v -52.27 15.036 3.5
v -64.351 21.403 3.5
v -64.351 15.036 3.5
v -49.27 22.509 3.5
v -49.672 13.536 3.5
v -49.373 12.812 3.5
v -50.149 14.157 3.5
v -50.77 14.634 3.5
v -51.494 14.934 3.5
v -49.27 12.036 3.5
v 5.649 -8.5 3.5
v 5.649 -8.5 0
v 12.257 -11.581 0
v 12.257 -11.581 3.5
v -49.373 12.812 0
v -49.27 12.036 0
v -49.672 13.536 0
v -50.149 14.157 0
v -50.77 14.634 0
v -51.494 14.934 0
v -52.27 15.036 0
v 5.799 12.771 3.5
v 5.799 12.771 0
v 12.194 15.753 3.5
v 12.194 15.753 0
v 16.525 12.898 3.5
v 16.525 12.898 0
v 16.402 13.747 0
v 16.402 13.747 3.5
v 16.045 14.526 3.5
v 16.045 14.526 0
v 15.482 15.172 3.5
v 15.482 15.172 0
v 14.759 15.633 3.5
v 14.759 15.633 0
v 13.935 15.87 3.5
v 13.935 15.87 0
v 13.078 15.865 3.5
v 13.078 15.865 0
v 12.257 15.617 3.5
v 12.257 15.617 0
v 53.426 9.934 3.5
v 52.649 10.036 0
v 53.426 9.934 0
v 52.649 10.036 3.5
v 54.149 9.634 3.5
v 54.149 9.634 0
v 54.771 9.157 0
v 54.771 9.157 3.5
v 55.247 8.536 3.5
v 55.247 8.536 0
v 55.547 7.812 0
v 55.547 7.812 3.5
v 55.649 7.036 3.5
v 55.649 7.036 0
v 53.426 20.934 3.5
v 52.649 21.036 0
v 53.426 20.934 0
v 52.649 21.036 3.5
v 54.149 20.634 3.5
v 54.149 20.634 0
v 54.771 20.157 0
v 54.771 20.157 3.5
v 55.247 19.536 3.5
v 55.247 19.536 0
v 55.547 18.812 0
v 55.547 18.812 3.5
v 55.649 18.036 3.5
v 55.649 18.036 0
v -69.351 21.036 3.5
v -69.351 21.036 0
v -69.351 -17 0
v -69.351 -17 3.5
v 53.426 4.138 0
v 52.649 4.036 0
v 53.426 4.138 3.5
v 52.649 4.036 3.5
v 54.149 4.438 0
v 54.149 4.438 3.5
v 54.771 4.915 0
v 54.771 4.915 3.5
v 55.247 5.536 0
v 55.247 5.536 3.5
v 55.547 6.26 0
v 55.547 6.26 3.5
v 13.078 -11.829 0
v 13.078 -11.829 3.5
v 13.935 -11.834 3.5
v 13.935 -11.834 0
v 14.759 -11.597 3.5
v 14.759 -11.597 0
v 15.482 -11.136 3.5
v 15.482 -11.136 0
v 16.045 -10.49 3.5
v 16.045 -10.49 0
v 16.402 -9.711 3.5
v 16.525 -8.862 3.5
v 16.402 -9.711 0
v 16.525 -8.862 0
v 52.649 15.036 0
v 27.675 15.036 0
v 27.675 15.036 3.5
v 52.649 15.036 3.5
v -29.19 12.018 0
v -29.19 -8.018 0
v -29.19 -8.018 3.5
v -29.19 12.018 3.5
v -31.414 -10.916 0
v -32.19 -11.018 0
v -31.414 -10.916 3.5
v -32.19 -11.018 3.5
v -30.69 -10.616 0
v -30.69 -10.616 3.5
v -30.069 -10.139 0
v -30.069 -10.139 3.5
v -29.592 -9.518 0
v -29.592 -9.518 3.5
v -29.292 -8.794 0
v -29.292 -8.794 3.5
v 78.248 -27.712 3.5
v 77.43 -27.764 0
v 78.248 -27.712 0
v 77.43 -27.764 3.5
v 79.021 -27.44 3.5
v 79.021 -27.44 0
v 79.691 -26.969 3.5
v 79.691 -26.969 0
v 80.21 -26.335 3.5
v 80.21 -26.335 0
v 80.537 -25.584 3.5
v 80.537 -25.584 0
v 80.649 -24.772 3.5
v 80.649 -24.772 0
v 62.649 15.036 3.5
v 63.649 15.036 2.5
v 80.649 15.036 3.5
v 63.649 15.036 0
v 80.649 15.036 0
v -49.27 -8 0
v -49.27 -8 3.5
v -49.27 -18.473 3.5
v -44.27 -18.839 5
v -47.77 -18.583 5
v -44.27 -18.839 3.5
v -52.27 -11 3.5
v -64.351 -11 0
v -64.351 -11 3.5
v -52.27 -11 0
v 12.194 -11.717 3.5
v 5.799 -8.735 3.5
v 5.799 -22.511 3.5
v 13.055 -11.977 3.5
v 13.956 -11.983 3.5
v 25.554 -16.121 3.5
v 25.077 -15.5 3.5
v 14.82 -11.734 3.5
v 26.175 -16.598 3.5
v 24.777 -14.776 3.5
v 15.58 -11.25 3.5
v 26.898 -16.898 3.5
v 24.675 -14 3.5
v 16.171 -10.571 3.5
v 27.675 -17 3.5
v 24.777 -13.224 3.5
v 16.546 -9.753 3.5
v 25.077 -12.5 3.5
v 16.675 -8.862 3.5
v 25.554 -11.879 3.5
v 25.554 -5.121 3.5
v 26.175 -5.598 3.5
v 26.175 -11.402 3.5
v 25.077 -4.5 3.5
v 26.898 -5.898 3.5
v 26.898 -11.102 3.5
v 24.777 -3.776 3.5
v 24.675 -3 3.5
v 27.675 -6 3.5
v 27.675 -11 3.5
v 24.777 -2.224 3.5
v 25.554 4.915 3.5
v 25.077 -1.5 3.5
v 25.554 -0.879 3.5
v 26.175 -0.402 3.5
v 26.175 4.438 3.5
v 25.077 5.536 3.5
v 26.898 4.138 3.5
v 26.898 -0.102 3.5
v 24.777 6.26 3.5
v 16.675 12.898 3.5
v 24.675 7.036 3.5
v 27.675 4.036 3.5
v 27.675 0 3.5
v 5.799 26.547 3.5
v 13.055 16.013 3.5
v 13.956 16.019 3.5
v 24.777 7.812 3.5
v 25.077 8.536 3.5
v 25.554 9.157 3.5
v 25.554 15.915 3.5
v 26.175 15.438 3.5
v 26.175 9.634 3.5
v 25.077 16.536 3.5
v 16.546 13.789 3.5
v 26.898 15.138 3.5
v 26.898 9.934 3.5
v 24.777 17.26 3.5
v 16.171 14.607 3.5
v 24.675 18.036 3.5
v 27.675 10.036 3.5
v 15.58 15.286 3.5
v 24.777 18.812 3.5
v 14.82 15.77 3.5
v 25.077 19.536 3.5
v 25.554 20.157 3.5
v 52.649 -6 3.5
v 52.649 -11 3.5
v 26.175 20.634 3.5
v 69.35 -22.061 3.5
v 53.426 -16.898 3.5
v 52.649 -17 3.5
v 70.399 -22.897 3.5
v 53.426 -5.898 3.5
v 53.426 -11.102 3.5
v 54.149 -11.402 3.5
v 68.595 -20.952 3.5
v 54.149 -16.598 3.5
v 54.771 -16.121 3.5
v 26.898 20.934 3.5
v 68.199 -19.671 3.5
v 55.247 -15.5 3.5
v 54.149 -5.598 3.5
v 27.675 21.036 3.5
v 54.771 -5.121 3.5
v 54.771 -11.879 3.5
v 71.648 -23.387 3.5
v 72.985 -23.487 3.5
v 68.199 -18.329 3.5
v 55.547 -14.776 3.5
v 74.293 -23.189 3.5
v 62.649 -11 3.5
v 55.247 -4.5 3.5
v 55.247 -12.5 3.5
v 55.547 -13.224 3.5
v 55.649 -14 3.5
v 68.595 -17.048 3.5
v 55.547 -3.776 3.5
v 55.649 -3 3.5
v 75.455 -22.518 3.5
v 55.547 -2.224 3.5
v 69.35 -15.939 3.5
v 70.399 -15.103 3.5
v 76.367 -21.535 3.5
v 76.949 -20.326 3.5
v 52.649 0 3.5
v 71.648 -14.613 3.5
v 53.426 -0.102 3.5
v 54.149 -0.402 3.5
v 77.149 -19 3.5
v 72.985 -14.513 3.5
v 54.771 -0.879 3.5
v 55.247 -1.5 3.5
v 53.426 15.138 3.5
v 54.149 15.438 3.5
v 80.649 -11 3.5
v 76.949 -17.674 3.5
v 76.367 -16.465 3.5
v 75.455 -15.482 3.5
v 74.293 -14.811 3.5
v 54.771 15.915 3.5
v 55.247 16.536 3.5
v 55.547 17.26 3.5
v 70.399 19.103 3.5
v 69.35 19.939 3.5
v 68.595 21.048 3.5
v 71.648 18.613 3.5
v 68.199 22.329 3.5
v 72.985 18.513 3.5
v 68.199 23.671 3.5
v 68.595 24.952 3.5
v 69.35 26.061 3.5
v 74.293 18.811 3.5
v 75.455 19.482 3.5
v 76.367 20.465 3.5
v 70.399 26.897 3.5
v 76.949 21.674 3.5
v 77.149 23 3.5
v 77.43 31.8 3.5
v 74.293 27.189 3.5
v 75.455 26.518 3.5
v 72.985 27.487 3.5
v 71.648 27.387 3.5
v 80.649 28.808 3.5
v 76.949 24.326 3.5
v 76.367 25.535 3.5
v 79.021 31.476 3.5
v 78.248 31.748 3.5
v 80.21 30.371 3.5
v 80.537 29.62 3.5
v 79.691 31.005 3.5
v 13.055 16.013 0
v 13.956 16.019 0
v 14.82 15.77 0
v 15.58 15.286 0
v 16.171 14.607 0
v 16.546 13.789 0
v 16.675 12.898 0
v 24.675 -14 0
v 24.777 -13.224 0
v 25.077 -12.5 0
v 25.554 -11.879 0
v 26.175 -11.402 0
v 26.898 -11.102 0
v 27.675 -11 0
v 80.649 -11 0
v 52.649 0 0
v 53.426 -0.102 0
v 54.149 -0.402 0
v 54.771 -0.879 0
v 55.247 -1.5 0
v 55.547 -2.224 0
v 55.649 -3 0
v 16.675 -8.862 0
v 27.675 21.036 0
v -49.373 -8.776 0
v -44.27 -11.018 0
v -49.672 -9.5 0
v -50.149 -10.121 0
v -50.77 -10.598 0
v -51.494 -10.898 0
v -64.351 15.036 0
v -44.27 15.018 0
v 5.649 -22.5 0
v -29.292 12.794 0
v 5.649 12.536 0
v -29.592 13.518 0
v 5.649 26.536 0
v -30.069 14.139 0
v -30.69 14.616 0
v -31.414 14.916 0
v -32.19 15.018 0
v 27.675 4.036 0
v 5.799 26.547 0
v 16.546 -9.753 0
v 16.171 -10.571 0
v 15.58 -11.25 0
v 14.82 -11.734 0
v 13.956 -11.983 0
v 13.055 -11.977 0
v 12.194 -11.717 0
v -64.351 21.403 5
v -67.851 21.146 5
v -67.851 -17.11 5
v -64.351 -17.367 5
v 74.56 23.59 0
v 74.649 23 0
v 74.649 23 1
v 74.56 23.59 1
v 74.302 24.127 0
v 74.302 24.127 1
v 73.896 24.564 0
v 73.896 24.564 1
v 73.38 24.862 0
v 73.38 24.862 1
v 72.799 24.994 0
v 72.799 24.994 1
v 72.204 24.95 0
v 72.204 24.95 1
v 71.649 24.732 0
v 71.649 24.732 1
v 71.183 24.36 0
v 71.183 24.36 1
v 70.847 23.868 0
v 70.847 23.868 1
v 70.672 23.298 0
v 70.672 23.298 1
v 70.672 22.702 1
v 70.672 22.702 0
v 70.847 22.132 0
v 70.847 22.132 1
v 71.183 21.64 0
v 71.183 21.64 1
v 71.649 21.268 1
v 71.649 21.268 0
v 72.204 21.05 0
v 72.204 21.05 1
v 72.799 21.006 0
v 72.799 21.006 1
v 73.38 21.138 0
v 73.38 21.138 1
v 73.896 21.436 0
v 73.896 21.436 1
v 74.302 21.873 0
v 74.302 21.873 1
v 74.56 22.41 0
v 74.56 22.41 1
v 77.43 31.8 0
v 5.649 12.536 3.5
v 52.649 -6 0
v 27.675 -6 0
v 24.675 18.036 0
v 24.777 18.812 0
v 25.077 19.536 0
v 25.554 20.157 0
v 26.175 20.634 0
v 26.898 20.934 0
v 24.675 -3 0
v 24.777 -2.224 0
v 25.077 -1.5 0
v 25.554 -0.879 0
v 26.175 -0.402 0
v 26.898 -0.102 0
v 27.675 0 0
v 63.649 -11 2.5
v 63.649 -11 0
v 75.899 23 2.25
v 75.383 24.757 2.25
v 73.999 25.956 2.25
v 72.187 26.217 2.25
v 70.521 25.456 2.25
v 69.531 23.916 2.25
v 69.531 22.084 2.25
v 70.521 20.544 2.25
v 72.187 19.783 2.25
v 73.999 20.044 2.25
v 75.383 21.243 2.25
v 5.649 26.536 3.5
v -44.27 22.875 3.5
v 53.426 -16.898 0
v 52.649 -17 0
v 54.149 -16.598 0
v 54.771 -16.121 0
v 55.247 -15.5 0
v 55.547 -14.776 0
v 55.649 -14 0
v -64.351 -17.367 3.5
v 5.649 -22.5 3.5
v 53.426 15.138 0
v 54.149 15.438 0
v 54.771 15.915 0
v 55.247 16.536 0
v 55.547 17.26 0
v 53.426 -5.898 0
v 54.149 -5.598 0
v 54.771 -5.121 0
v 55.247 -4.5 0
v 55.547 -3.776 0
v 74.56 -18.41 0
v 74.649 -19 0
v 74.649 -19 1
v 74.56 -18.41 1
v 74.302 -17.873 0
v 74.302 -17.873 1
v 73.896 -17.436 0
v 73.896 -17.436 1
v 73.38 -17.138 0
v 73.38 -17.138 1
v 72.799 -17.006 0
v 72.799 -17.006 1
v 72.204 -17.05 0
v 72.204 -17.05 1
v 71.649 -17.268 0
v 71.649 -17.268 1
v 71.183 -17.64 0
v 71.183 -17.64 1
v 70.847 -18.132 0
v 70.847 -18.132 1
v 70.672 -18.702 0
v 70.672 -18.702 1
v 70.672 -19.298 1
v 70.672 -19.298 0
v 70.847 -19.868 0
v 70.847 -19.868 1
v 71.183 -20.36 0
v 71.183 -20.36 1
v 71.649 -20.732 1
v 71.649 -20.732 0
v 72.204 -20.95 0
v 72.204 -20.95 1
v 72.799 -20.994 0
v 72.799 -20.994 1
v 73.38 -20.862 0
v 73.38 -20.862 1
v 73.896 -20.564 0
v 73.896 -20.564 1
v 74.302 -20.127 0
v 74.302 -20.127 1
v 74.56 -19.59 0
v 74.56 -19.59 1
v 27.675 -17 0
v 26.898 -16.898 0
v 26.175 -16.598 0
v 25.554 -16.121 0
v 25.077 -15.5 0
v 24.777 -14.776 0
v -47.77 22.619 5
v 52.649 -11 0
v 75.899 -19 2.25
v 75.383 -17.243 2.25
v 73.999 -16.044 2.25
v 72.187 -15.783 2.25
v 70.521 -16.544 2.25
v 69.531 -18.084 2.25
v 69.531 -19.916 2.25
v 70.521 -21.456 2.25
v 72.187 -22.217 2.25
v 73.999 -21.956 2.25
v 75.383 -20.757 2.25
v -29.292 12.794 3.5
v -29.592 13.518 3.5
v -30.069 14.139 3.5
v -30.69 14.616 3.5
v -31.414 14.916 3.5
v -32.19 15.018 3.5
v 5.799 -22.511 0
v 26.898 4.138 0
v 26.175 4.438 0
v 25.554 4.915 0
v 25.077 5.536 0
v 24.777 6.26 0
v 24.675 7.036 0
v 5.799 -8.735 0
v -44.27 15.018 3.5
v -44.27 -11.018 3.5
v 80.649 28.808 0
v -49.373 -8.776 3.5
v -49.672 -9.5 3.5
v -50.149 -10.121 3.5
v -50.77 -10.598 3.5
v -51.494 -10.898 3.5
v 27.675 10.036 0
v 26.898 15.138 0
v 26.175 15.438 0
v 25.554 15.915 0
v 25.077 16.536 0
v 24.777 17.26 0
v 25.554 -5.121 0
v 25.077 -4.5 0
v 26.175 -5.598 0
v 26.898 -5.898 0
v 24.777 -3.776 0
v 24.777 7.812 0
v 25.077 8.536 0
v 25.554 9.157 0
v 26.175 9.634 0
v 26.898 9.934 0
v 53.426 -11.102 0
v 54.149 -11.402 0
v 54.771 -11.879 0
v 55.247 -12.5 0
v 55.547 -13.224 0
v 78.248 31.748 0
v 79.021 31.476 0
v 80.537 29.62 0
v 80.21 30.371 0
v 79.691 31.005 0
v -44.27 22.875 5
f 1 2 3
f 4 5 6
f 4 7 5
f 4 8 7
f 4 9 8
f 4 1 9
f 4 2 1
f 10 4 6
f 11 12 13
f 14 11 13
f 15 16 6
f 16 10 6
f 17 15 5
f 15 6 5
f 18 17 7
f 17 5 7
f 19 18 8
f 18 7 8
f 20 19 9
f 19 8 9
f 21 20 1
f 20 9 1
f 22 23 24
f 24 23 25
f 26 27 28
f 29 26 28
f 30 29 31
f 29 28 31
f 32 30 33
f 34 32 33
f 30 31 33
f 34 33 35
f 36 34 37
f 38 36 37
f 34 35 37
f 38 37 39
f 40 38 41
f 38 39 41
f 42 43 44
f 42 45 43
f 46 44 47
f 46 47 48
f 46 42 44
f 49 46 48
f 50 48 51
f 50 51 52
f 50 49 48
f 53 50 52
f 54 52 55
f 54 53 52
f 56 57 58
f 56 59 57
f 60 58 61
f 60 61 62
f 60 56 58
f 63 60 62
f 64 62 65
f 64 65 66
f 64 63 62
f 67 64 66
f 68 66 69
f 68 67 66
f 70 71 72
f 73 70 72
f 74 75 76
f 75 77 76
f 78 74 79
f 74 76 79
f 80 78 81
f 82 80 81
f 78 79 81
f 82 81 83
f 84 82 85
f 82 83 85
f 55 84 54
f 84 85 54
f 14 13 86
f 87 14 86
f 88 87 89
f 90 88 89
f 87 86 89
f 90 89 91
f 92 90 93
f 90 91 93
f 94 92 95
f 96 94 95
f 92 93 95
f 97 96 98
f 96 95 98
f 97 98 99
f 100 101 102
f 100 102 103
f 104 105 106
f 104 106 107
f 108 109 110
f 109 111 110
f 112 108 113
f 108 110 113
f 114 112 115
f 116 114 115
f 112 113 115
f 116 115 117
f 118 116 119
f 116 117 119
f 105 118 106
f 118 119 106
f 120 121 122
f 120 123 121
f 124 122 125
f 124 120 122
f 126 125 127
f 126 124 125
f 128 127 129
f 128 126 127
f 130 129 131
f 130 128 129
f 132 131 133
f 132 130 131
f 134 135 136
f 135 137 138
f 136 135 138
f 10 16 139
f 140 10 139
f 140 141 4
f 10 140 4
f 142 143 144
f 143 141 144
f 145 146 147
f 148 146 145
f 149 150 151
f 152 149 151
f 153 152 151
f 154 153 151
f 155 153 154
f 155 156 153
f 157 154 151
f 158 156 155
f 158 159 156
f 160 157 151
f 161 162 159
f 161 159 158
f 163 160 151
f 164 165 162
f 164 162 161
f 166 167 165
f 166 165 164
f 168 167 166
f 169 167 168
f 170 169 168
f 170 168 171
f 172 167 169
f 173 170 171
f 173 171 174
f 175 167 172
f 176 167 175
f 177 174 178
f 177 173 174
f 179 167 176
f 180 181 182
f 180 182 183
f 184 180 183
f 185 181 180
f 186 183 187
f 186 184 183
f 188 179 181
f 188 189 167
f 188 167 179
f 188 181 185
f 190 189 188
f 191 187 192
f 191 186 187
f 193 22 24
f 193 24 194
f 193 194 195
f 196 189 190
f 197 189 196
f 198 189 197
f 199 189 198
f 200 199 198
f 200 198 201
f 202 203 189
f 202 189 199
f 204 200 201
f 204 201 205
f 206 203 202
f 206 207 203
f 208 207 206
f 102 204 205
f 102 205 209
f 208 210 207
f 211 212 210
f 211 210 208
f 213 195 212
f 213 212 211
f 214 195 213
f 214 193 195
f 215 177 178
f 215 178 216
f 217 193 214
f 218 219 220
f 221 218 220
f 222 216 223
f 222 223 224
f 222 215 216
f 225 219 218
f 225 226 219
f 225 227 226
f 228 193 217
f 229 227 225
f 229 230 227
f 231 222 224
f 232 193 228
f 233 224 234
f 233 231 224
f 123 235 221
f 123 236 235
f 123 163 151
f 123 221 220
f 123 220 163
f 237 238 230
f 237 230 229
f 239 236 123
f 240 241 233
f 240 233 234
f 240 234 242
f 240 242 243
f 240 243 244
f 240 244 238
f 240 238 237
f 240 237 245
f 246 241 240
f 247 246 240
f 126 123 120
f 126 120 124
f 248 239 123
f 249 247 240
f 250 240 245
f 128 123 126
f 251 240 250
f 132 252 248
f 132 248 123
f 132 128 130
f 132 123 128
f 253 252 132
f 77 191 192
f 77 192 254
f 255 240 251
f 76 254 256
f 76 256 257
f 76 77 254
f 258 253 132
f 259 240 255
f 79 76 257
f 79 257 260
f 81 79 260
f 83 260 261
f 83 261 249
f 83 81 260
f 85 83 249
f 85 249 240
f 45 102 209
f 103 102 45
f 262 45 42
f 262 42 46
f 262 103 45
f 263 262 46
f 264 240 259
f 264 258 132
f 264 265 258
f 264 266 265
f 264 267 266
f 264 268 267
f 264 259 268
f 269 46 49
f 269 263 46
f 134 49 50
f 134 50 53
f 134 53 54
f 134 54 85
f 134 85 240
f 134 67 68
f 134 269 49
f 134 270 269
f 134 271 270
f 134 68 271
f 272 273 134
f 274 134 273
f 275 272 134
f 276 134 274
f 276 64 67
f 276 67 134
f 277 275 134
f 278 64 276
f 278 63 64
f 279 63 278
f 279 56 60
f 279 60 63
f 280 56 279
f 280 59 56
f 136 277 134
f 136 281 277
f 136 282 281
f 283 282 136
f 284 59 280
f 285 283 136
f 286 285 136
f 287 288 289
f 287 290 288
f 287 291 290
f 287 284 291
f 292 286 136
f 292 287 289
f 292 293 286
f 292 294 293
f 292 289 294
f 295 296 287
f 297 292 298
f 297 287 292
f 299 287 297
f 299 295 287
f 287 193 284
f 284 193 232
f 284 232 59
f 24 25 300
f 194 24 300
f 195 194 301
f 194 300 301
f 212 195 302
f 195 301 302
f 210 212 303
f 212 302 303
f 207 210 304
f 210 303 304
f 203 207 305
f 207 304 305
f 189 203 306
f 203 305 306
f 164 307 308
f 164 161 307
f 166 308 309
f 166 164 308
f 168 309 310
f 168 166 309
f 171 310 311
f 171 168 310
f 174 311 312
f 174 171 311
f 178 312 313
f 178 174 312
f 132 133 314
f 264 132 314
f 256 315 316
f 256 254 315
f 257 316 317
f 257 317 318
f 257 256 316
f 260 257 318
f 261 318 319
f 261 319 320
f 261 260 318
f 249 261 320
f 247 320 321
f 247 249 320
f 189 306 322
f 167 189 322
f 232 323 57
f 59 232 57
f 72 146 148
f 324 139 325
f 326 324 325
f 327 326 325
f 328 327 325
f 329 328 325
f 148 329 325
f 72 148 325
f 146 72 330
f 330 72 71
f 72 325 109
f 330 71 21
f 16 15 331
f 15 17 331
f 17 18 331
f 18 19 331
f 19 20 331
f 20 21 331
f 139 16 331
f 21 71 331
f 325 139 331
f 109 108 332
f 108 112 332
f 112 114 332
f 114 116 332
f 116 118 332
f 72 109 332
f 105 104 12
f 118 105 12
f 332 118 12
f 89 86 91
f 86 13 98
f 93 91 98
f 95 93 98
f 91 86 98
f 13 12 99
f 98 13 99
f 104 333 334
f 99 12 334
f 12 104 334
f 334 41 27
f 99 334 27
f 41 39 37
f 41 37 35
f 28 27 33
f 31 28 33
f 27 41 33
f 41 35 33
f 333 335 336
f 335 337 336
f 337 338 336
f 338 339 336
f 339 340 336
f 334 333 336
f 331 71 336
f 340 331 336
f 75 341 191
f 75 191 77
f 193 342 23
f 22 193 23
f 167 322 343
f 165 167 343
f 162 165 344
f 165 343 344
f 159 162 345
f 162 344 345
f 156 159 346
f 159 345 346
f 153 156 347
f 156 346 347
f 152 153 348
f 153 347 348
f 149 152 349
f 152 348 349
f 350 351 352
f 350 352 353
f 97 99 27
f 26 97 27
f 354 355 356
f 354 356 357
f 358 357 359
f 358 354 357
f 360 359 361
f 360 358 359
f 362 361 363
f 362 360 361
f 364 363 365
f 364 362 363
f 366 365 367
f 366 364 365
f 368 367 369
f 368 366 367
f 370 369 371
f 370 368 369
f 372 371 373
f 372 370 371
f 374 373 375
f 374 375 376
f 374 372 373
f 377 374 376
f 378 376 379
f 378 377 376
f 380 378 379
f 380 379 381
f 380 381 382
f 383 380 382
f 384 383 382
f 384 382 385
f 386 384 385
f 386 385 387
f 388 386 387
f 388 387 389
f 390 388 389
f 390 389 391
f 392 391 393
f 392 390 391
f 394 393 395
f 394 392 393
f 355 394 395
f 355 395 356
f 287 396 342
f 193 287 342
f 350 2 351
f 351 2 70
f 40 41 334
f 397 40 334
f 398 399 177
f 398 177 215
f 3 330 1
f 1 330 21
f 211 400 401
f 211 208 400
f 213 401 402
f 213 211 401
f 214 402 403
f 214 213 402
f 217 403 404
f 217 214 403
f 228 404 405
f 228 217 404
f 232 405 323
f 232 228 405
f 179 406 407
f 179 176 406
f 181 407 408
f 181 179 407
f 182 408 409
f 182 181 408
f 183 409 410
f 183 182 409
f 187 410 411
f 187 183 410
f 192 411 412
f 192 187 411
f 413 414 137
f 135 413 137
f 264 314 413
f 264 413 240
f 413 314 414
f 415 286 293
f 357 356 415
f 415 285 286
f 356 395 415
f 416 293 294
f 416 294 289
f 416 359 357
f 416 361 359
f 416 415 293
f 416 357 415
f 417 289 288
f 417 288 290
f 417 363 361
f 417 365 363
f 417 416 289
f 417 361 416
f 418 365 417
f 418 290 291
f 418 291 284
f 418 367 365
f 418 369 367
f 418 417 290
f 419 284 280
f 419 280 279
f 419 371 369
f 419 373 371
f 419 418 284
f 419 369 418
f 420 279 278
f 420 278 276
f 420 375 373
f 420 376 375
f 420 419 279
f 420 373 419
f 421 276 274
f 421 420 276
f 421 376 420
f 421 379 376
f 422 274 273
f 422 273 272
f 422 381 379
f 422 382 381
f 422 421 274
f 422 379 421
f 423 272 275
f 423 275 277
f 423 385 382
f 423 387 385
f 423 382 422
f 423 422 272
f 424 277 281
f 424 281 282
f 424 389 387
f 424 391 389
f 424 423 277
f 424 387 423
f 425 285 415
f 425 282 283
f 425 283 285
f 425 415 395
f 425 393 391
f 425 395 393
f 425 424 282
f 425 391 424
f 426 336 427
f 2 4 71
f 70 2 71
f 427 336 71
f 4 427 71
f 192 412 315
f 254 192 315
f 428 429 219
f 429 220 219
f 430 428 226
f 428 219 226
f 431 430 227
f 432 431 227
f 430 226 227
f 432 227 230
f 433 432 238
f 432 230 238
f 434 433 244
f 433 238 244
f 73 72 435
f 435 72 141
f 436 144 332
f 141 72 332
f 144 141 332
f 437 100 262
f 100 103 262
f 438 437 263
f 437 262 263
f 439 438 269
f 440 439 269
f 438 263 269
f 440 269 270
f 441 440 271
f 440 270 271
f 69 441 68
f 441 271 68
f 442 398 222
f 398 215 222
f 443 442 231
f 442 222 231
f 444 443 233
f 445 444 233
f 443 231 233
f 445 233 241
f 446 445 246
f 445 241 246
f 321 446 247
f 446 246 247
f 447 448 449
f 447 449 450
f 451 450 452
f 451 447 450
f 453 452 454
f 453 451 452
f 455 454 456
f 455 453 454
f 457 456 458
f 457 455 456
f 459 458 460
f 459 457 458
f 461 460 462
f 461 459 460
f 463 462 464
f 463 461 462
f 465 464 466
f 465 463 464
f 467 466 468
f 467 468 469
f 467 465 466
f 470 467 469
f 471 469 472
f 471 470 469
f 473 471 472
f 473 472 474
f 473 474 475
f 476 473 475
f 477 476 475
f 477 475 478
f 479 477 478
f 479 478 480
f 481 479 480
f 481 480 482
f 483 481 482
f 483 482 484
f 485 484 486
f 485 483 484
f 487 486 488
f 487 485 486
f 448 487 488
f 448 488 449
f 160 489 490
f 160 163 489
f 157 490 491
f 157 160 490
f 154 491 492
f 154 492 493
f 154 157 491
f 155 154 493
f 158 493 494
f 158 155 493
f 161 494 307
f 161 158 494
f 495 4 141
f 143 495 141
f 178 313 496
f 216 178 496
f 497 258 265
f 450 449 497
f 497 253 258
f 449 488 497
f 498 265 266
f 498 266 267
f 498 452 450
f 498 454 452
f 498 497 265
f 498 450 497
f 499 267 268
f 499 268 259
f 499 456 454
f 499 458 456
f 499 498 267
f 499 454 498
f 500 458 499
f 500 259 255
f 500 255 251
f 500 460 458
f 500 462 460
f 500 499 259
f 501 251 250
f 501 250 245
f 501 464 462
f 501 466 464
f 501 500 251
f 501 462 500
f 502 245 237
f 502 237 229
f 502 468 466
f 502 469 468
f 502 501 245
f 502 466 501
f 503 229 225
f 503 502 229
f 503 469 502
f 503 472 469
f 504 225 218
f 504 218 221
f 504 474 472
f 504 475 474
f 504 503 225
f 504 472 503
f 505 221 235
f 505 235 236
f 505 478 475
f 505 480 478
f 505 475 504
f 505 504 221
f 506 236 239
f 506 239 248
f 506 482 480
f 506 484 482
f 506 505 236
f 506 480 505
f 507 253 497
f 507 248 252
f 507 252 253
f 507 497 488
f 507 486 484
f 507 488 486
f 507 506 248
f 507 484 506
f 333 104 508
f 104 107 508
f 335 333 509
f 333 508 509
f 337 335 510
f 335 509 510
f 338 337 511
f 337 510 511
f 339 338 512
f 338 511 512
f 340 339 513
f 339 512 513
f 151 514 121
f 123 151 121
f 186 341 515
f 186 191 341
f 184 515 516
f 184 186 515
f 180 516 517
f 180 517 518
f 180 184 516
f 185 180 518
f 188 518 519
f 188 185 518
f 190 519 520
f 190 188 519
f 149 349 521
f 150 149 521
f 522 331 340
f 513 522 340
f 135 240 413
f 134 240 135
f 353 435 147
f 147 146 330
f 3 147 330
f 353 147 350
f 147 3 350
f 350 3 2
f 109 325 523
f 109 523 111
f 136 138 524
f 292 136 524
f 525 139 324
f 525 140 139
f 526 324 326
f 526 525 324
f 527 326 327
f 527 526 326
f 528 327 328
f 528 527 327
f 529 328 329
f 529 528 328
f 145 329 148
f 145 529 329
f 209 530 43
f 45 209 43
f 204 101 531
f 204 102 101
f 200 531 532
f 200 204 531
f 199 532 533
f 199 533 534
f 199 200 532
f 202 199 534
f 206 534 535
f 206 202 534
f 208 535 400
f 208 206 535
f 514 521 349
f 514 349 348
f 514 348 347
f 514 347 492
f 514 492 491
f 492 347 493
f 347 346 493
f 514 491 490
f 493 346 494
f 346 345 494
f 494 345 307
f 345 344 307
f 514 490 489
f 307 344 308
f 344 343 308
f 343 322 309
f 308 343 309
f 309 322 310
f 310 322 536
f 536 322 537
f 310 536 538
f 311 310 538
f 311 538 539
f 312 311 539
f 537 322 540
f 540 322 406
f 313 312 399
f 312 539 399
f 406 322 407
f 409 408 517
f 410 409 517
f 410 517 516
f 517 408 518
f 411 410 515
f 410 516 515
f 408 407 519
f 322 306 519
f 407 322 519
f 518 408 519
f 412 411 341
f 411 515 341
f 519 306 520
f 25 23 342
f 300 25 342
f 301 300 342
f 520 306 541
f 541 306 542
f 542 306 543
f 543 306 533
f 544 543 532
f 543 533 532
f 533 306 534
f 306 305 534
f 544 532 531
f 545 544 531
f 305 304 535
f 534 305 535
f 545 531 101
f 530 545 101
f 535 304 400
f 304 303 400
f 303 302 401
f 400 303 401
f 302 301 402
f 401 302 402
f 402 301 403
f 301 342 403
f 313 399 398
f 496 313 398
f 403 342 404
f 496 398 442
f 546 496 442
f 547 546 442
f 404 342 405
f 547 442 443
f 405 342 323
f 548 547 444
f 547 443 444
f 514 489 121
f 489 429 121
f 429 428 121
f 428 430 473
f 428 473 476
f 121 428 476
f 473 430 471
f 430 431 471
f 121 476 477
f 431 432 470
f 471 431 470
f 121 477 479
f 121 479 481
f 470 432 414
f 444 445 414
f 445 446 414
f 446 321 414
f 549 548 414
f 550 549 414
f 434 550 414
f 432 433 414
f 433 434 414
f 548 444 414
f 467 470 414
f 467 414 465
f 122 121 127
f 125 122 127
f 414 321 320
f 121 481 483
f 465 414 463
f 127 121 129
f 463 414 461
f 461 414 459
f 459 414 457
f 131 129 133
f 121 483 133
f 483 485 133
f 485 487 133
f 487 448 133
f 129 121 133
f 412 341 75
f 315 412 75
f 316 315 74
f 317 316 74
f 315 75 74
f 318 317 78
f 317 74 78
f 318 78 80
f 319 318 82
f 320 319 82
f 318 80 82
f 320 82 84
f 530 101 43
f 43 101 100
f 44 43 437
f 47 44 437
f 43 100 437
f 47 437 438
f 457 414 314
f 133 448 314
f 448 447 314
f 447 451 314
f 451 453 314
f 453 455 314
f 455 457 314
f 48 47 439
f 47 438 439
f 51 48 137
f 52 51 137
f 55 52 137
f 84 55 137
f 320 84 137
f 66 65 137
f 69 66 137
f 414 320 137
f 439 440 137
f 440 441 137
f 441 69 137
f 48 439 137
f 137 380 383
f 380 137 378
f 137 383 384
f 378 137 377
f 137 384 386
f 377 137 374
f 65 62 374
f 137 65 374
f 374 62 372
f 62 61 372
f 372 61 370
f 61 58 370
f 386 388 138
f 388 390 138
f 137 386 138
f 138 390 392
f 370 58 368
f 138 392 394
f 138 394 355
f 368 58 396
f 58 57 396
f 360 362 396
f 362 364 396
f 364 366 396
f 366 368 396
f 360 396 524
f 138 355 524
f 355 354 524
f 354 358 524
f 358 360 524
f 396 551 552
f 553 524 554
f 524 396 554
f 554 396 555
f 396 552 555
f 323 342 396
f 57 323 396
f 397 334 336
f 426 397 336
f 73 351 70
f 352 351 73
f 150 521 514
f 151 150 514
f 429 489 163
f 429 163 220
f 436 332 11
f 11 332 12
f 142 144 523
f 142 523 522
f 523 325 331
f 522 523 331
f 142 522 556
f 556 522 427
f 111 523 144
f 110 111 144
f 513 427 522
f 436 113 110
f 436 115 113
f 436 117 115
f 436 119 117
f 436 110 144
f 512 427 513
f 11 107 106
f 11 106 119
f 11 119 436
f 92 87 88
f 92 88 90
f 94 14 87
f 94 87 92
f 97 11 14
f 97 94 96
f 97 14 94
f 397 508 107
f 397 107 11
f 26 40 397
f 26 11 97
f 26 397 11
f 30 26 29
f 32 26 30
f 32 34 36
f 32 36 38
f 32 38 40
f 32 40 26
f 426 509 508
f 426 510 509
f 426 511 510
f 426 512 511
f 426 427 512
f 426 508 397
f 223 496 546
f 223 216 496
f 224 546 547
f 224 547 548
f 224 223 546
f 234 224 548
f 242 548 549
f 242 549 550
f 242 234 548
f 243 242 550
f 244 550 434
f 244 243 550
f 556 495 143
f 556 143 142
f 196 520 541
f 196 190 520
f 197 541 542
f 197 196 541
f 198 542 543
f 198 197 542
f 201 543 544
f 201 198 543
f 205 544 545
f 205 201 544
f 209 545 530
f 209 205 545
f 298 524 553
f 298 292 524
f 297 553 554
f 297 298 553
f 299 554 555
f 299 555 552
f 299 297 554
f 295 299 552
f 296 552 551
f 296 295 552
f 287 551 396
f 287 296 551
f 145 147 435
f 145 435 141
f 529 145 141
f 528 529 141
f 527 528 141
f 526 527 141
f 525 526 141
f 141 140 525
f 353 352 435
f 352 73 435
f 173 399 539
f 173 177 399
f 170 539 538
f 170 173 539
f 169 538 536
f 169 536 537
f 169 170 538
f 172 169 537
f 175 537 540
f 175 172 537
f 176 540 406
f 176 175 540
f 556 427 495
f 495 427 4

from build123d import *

# Parameters (mm, degrees)
F0_W     = 15.0803372804
F0_H     = 26.0359900557
F1_DEPTH = 3.5
F0_W_2   = 30.9743065556
F0_H_2   = 6
F0_R     = 2
F2_SIZE  = 1
F3_SIZE  = 2.5
F5_DEPTH = 1.5
F6_R     = 3
F7_SIZE  = 1.49999
F8_R     = 3
F9_R     = 2.99999


# Not quite as in the source:
# - a fillet or chamfer is up to 0.001 mm smaller than in the source, because OpenCascade refuses the exact size


with BuildPart() as f1:
    # F0 (on Top) → F1 (new body)
    with BuildSketch(Plane.XY):
        with BuildLine():
            Line((5.6491911411, 26.5359900557), (-69.3508088589, 21.0359900557))
            Line((-69.3508088589, 21.0359900557), (-69.3508088589, -17))
            Line((-69.3508088589, -17), (5.6491911411, -22.5))
            Line((5.6491911411, -22.5), (5.6491911411, -8.5))
            Line((5.6491911411, -8.5), (12.2570298003, -11.5812857706))
            ThreePointArc((12.2570298003, -11.5812857706), (15.1367834106, -11.392536747), (16.5248845856, -8.8623624095))
            Line((16.5248845856, -8.8623624095), (16.5248845856, 12.8983524652))
            ThreePointArc((16.5248845856, 12.8983524652), (15.1367834106, 15.4285268026), (12.2570298003, 15.6172758263))
            Line((12.2570298003, 15.6172758263), (5.6491911411, 12.5359900557))
            Line((5.6491911411, 12.5359900557), (5.6491911411, 26.5359900557))
        make_face()
        with Locations((-56.8106402187, 2.0179950278)):
            Rectangle(F0_W, F0_H, mode=Mode.SUBTRACT)
        with Locations((-36.7303029383, 2.0000000728)):
            Rectangle(F0_W, F0_H, mode=Mode.SUBTRACT)
    extrude(amount=F1_DEPTH)

    # F4 (on face) → F5 (join)
    with BuildSketch(Plane.XY.offset(3.5)):
        Polygon((-64.3508088589, 21.4026567223), (-69.3508088589, 21.0359900557), (-69.3508088589, -17), (-64.3508088589, -17.3666666667), (-64.3508088589, -11), (-64.3508088589, 15.0359900557), align=None)
        Polygon((-44.2704715785, 22.8752147895), (-49.2704715785, 22.5085481229), (-49.2704715785, 15.0359900557), (-49.2704715785, -11), (-49.2704715785, -18.4725580672), (-44.2704715785, -18.8392247339), (-44.2704715785, -11.0179949551), (-44.2704715785, 15.0179951006), align=None)
    extrude(amount=F5_DEPTH)

    # F6
    f6_edges = [f1.edges().sort_by_distance(p)[0] for p in [
        (-49.270472, 15.03599, 1.75),
        (-29.190134, 15.017995, 1.75),
        (-49.270472, -11, 1.75),
        (-29.190134, -11.017995, 1.75),
    ]]
    fillet(f6_edges, radius=F6_R)

    # F7 (size 1.5 in the source; OpenCascade refuses exactly that, so slightly less here)
    f7_edges = [f1.edges().sort_by_distance(p)[0] for p in [
        (-69.350809, 2.017995, 5),
        (-49.270472, 2.017995, 5),
    ]]
    chamfer(f7_edges, length=F7_SIZE)


with BuildPart() as f1b:
    # F0 (on Top) → F1, piece 2 (new body)
    with BuildSketch(Plane.XY):
        with BuildLine():
            Line((5.7991911411, -22.511), (80.6491911411, -28))
            Line((80.6491911411, -28), (80.6491911411, -11))
            Line((80.6491911411, -11), (63.6491911411, -11))
            Line((63.6491911411, -11), (63.6491911411, 15.0359900557))
            Line((63.6491911411, 15.0359900557), (80.6491911411, 15.0359900557))
            Line((80.6491911411, 15.0359900557), (80.6491911411, 32.0359900557))
            Line((80.6491911411, 32.0359900557), (5.7991911411, 26.5469900557))
            Line((5.7991911411, 26.5469900557), (5.7991911411, 12.7714428922))
            Line((5.7991911411, 12.7714428922), (12.1936370611, 15.7532219944))
            ThreePointArc((12.1936370611, 15.7532219944), (15.2173783519, 15.5550355195), (16.6748845856, 12.8983524652))
            Line((16.6748845856, 12.8983524652), (16.6748845856, -8.8623624095))
            ThreePointArc((16.6748845856, -8.8623624095), (15.2173783519, -11.5190454638), (12.1936370611, -11.7172319387))
            Line((12.1936370611, -11.7172319387), (5.7991911411, -8.7354528366))
            Line((5.7991911411, -8.7354528366), (5.7991911411, -22.511))
        make_face()
        with Locations((40.1620378633, -14)):
            Rectangle(F0_W_2, F0_H_2, mode=Mode.SUBTRACT)
        with Locations((72.6491911411, -19)):
            Circle(F0_R, mode=Mode.SUBTRACT)
        with Locations((40.1620378633, -3)):
            Rectangle(F0_W_2, F0_H_2, mode=Mode.SUBTRACT)
        with Locations((40.1620378633, 7.0359900557)):
            Rectangle(F0_W_2, F0_H_2, mode=Mode.SUBTRACT)
        with Locations((40.1620378633, 18.0359900557)):
            Rectangle(F0_W_2, F0_H_2, mode=Mode.SUBTRACT)
        with Locations((72.6491911411, 23)):
            Circle(F0_R, mode=Mode.SUBTRACT)
    extrude(amount=F1_DEPTH)

    # F2
    f2_edges = [f1b.edges().sort_by_distance(p)[0] for p in [
        (63.649191, 2.017995, 3.5),
    ]]
    chamfer(f2_edges, length=F2_SIZE)

    # F3
    f3_edges = [f1b.edges().sort_by_distance(p)[0] for p in [
        (70.649191, 23, 3.5),
        (70.649191, -19, 3.5),
    ]]
    chamfer(f3_edges, length=F3_SIZE)

    # F8
    f8_edges = [f1b.edges().sort_by_distance(p)[0] for p in [
        (80.649191, 32.03599, 1.75),
        (80.649191, -28, 1.75),
    ]]
    fillet(f8_edges, radius=F8_R)

    # F9 (radius 3 in the source; OpenCascade refuses exactly that, so slightly less here)
    f9_edges = [f1b.edges().sort_by_distance(p)[0] for p in [
        (24.674885, 21.03599, 1.75),
        (24.674885, 10.03599, 1.75),
        (24.674885, 0, 1.75),
        (24.674885, -11, 1.75),
        (24.674885, 15.03599, 1.75),
        (24.674885, 4.03599, 1.75),
        (24.674885, -6, 1.75),
        (24.674885, -17, 1.75),
        (55.649191, 21.03599, 1.75),
        (55.649191, 10.03599, 1.75),
        (55.649191, 0, 1.75),
        (55.649191, -11, 1.75),
        (55.649191, -17, 1.75),
        (55.649191, -6, 1.75),
        (55.649191, 4.03599, 1.75),
        (55.649191, 15.03599, 1.75),
    ]]
    fillet(f9_edges, radius=F9_R)


solid = Compound([f1.part, f1b.part])
